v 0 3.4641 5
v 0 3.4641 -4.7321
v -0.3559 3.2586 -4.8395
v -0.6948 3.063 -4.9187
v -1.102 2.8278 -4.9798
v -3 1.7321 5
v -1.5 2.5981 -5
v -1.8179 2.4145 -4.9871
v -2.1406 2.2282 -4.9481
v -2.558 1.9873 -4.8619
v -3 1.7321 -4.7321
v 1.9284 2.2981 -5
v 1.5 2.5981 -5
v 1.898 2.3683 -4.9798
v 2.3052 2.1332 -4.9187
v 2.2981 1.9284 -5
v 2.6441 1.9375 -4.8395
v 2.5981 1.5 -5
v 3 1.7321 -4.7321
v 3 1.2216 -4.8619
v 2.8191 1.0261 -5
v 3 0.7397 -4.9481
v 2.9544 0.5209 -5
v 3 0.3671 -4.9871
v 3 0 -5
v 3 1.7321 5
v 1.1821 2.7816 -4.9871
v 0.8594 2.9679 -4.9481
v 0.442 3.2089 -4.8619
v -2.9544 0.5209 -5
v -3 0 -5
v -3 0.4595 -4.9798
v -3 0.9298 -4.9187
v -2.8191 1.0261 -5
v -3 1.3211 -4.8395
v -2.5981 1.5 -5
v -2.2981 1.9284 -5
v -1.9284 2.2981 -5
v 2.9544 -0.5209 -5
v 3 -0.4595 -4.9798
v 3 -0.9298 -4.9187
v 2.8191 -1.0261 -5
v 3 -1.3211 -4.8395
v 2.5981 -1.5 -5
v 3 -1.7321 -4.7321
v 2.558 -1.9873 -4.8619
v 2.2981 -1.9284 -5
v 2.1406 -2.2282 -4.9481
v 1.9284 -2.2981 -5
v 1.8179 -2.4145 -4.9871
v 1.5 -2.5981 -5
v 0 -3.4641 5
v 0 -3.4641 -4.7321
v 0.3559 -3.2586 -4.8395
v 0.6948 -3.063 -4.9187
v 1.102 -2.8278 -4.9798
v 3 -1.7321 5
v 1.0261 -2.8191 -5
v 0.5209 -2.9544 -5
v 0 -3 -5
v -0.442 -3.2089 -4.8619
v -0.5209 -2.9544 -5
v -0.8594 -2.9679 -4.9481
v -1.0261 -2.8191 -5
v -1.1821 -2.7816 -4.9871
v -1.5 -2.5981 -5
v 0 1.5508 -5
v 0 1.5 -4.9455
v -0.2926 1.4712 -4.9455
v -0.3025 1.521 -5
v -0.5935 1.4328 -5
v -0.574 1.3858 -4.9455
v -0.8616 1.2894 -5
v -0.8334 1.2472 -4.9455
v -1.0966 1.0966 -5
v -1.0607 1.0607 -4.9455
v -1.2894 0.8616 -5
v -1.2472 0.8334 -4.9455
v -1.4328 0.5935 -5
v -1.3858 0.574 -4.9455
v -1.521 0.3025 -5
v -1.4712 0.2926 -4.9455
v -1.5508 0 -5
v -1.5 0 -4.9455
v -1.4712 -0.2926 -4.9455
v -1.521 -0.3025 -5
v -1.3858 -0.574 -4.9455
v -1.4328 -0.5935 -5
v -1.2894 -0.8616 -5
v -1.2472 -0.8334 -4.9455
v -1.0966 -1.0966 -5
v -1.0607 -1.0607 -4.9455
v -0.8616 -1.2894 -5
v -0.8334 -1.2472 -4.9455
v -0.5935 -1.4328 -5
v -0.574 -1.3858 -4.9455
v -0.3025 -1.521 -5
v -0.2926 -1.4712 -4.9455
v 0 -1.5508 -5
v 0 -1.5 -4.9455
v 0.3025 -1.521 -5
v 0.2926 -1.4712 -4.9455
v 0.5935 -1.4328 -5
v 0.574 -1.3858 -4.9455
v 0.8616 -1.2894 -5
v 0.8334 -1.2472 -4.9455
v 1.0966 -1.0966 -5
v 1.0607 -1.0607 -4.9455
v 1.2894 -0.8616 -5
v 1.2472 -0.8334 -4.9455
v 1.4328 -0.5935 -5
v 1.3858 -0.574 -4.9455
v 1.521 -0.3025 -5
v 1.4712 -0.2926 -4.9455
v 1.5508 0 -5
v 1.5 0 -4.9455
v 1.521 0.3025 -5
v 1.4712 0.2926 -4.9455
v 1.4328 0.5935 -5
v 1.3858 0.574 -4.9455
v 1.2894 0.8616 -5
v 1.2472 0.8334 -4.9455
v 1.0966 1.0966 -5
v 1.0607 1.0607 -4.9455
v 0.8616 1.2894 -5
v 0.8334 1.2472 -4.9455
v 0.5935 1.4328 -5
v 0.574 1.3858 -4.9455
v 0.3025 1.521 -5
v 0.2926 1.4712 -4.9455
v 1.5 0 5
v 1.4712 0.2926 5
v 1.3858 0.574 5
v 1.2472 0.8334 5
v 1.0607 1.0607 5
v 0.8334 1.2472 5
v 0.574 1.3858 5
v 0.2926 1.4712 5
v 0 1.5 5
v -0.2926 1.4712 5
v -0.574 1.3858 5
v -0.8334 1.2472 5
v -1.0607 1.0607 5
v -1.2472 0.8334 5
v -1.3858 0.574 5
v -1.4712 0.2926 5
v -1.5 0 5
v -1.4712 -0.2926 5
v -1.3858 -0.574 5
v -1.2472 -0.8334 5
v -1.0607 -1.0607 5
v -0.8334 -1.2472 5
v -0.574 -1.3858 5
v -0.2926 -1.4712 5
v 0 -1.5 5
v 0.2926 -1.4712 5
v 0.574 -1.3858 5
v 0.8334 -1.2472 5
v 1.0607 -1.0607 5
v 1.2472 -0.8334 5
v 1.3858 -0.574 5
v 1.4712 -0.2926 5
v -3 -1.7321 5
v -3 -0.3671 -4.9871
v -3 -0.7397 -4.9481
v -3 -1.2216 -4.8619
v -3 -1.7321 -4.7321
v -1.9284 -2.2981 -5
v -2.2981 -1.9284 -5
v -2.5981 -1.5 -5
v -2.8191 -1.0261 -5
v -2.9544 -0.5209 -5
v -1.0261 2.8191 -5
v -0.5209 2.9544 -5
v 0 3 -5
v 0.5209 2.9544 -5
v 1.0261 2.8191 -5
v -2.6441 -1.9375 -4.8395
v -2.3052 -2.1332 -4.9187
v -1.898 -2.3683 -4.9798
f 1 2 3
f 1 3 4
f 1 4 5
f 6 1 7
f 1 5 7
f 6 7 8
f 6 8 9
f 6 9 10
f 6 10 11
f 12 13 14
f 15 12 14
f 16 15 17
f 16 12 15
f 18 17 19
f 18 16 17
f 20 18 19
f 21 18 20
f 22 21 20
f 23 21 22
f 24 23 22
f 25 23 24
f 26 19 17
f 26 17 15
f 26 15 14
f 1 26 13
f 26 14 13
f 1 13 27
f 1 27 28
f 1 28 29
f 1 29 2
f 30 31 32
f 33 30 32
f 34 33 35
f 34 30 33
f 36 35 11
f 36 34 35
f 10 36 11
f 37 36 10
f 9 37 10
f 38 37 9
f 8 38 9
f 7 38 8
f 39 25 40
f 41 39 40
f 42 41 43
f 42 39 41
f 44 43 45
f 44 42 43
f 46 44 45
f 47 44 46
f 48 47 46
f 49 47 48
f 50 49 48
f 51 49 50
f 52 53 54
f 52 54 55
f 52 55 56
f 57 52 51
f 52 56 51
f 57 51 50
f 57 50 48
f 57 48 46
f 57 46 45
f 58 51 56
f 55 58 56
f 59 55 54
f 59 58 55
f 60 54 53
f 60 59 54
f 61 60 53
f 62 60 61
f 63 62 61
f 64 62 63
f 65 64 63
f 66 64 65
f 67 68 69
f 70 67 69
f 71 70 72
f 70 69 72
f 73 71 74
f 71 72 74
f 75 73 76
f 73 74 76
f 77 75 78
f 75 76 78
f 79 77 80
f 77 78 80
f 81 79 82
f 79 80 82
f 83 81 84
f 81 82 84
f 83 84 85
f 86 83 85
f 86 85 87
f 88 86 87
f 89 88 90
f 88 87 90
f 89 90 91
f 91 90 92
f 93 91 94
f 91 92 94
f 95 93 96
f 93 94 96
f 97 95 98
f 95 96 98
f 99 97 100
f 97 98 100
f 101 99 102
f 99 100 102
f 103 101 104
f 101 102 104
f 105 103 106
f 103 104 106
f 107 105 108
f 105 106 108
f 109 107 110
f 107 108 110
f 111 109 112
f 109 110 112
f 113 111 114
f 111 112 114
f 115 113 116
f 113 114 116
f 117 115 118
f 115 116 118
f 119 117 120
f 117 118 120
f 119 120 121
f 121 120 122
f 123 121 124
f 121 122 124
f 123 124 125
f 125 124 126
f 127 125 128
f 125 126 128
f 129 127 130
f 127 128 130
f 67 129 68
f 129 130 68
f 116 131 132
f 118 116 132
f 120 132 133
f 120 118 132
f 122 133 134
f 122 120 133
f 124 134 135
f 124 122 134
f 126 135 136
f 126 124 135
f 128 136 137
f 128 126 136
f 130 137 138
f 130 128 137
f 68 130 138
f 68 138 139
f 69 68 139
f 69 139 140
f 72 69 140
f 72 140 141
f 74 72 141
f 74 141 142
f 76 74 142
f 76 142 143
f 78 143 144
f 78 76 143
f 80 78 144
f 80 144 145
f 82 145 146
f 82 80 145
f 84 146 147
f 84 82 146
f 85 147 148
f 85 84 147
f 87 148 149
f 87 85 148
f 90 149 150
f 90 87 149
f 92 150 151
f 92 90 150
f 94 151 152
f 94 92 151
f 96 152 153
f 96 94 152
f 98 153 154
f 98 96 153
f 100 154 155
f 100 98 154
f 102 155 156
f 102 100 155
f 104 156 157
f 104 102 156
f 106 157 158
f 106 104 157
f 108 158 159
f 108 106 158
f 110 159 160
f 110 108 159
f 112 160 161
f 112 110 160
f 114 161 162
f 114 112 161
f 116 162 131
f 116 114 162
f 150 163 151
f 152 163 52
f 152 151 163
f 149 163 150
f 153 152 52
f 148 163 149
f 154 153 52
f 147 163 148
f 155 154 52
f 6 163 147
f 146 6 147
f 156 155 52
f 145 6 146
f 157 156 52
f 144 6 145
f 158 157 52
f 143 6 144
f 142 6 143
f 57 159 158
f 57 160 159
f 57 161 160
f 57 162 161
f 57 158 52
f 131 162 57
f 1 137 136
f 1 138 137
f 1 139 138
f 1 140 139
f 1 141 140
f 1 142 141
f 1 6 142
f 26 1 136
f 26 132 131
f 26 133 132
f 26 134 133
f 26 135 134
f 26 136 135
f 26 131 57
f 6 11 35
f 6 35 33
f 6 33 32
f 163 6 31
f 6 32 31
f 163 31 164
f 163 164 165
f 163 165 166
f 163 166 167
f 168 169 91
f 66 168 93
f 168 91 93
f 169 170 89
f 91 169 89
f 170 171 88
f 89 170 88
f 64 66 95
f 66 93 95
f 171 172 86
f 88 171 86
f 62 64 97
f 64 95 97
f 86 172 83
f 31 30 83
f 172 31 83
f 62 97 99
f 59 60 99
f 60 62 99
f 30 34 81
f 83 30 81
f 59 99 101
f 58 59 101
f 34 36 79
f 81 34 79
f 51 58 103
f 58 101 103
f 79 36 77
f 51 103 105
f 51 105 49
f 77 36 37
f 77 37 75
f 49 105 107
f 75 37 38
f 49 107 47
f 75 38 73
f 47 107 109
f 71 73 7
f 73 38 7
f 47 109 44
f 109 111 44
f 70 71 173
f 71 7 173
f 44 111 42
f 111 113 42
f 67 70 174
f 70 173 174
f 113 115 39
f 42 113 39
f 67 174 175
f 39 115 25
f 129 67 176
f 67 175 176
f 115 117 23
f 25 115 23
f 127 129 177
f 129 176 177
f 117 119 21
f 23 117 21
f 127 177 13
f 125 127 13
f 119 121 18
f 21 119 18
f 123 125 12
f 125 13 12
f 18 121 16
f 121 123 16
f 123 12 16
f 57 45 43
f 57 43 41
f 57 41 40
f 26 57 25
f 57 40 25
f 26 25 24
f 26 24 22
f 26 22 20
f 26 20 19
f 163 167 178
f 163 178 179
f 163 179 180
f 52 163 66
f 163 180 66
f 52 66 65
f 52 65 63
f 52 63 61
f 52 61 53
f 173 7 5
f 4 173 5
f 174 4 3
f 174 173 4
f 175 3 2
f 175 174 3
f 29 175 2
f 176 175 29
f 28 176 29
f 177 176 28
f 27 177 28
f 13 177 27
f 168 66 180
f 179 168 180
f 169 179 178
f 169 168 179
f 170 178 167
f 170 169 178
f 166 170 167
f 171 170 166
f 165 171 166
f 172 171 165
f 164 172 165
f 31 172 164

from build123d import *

# Parameters (mm, degrees)
EXTRUDE1_DEPTH      = 5
EXTRUDE1_DEPTH_BACK = 5
SKETCH1_R           = 1.5
SKETCH8_OUTSIDE_W   = 52.282
SKETCH8_OUTSIDE_H   = 53.21
SKETCH8_OUTSIDE_R   = 3
EXTRUDE4_DEPTH      = 12
EXTRUDE4_DRAFT      = -60


with BuildPart() as part:
    # Sketch1 → Extrude1 (new, two sides: drawn at the far end of the back side and taken through both)
    with BuildSketch(Plane.XY.offset(-EXTRUDE1_DEPTH_BACK)):
        Polygon((0, 3.464101615), (-3, 1.732050808), (-3, -1.732050808), (0, -3.464101615), (3, -1.732050808), (3, 1.732050808), align=None)
        Circle(SKETCH1_R, mode=Mode.SUBTRACT)
    extrude(amount=EXTRUDE1_DEPTH + EXTRUDE1_DEPTH_BACK)

    # Extrude3 cone 1 section (through the dimple's axis) → Extrude3 (revolve, cut)
    with BuildSketch(Plane(origin=(0, 0, -5), x_dir=(0, 1, 0), z_dir=(1, 0, 0))):
        Polygon((0, 0), (1.5508, 0), (0, 1.663029396), align=None)
    revolve(axis=Axis((0, 0, -5), (0, 0, 1)), mode=Mode.SUBTRACT)


with BuildPart() as extrude4_tool:
    # Sketch8 outside → Extrude4 (with draft: the straight prism first)
    with BuildSketch(Plane(origin=(0, 0, -5), x_dir=(-1, 0, 0), z_dir=(0, 0, -1))):
        Rectangle(SKETCH8_OUTSIDE_W, SKETCH8_OUTSIDE_H)
        Circle(SKETCH8_OUTSIDE_R, mode=Mode.SUBTRACT)
    extrude(amount=-EXTRUDE4_DEPTH)
    # Extrude4: the draft: its side faces are tilted about the plane it starts from
    extrude4_sides = [extrude4_tool.faces().sort_by_distance(p)[0] for p in [
        (0, -26.605, 1),
        (-26.141, 0, 1),
        (0, 26.605, 1),
        (26.141, 0, 1),
        (3, 0, 1),
    ]]
    draft(extrude4_sides, Plane(origin=(0, 0, -5), x_dir=(-1, 0, 0), z_dir=(0, 0, -1)), EXTRUDE4_DRAFT)


with BuildPart() as part_1:
    add(part.part)

    # Extrude4: cut by extrude4_tool
    add(extrude4_tool.part, mode=Mode.SUBTRACT)


solid = part_1.part
